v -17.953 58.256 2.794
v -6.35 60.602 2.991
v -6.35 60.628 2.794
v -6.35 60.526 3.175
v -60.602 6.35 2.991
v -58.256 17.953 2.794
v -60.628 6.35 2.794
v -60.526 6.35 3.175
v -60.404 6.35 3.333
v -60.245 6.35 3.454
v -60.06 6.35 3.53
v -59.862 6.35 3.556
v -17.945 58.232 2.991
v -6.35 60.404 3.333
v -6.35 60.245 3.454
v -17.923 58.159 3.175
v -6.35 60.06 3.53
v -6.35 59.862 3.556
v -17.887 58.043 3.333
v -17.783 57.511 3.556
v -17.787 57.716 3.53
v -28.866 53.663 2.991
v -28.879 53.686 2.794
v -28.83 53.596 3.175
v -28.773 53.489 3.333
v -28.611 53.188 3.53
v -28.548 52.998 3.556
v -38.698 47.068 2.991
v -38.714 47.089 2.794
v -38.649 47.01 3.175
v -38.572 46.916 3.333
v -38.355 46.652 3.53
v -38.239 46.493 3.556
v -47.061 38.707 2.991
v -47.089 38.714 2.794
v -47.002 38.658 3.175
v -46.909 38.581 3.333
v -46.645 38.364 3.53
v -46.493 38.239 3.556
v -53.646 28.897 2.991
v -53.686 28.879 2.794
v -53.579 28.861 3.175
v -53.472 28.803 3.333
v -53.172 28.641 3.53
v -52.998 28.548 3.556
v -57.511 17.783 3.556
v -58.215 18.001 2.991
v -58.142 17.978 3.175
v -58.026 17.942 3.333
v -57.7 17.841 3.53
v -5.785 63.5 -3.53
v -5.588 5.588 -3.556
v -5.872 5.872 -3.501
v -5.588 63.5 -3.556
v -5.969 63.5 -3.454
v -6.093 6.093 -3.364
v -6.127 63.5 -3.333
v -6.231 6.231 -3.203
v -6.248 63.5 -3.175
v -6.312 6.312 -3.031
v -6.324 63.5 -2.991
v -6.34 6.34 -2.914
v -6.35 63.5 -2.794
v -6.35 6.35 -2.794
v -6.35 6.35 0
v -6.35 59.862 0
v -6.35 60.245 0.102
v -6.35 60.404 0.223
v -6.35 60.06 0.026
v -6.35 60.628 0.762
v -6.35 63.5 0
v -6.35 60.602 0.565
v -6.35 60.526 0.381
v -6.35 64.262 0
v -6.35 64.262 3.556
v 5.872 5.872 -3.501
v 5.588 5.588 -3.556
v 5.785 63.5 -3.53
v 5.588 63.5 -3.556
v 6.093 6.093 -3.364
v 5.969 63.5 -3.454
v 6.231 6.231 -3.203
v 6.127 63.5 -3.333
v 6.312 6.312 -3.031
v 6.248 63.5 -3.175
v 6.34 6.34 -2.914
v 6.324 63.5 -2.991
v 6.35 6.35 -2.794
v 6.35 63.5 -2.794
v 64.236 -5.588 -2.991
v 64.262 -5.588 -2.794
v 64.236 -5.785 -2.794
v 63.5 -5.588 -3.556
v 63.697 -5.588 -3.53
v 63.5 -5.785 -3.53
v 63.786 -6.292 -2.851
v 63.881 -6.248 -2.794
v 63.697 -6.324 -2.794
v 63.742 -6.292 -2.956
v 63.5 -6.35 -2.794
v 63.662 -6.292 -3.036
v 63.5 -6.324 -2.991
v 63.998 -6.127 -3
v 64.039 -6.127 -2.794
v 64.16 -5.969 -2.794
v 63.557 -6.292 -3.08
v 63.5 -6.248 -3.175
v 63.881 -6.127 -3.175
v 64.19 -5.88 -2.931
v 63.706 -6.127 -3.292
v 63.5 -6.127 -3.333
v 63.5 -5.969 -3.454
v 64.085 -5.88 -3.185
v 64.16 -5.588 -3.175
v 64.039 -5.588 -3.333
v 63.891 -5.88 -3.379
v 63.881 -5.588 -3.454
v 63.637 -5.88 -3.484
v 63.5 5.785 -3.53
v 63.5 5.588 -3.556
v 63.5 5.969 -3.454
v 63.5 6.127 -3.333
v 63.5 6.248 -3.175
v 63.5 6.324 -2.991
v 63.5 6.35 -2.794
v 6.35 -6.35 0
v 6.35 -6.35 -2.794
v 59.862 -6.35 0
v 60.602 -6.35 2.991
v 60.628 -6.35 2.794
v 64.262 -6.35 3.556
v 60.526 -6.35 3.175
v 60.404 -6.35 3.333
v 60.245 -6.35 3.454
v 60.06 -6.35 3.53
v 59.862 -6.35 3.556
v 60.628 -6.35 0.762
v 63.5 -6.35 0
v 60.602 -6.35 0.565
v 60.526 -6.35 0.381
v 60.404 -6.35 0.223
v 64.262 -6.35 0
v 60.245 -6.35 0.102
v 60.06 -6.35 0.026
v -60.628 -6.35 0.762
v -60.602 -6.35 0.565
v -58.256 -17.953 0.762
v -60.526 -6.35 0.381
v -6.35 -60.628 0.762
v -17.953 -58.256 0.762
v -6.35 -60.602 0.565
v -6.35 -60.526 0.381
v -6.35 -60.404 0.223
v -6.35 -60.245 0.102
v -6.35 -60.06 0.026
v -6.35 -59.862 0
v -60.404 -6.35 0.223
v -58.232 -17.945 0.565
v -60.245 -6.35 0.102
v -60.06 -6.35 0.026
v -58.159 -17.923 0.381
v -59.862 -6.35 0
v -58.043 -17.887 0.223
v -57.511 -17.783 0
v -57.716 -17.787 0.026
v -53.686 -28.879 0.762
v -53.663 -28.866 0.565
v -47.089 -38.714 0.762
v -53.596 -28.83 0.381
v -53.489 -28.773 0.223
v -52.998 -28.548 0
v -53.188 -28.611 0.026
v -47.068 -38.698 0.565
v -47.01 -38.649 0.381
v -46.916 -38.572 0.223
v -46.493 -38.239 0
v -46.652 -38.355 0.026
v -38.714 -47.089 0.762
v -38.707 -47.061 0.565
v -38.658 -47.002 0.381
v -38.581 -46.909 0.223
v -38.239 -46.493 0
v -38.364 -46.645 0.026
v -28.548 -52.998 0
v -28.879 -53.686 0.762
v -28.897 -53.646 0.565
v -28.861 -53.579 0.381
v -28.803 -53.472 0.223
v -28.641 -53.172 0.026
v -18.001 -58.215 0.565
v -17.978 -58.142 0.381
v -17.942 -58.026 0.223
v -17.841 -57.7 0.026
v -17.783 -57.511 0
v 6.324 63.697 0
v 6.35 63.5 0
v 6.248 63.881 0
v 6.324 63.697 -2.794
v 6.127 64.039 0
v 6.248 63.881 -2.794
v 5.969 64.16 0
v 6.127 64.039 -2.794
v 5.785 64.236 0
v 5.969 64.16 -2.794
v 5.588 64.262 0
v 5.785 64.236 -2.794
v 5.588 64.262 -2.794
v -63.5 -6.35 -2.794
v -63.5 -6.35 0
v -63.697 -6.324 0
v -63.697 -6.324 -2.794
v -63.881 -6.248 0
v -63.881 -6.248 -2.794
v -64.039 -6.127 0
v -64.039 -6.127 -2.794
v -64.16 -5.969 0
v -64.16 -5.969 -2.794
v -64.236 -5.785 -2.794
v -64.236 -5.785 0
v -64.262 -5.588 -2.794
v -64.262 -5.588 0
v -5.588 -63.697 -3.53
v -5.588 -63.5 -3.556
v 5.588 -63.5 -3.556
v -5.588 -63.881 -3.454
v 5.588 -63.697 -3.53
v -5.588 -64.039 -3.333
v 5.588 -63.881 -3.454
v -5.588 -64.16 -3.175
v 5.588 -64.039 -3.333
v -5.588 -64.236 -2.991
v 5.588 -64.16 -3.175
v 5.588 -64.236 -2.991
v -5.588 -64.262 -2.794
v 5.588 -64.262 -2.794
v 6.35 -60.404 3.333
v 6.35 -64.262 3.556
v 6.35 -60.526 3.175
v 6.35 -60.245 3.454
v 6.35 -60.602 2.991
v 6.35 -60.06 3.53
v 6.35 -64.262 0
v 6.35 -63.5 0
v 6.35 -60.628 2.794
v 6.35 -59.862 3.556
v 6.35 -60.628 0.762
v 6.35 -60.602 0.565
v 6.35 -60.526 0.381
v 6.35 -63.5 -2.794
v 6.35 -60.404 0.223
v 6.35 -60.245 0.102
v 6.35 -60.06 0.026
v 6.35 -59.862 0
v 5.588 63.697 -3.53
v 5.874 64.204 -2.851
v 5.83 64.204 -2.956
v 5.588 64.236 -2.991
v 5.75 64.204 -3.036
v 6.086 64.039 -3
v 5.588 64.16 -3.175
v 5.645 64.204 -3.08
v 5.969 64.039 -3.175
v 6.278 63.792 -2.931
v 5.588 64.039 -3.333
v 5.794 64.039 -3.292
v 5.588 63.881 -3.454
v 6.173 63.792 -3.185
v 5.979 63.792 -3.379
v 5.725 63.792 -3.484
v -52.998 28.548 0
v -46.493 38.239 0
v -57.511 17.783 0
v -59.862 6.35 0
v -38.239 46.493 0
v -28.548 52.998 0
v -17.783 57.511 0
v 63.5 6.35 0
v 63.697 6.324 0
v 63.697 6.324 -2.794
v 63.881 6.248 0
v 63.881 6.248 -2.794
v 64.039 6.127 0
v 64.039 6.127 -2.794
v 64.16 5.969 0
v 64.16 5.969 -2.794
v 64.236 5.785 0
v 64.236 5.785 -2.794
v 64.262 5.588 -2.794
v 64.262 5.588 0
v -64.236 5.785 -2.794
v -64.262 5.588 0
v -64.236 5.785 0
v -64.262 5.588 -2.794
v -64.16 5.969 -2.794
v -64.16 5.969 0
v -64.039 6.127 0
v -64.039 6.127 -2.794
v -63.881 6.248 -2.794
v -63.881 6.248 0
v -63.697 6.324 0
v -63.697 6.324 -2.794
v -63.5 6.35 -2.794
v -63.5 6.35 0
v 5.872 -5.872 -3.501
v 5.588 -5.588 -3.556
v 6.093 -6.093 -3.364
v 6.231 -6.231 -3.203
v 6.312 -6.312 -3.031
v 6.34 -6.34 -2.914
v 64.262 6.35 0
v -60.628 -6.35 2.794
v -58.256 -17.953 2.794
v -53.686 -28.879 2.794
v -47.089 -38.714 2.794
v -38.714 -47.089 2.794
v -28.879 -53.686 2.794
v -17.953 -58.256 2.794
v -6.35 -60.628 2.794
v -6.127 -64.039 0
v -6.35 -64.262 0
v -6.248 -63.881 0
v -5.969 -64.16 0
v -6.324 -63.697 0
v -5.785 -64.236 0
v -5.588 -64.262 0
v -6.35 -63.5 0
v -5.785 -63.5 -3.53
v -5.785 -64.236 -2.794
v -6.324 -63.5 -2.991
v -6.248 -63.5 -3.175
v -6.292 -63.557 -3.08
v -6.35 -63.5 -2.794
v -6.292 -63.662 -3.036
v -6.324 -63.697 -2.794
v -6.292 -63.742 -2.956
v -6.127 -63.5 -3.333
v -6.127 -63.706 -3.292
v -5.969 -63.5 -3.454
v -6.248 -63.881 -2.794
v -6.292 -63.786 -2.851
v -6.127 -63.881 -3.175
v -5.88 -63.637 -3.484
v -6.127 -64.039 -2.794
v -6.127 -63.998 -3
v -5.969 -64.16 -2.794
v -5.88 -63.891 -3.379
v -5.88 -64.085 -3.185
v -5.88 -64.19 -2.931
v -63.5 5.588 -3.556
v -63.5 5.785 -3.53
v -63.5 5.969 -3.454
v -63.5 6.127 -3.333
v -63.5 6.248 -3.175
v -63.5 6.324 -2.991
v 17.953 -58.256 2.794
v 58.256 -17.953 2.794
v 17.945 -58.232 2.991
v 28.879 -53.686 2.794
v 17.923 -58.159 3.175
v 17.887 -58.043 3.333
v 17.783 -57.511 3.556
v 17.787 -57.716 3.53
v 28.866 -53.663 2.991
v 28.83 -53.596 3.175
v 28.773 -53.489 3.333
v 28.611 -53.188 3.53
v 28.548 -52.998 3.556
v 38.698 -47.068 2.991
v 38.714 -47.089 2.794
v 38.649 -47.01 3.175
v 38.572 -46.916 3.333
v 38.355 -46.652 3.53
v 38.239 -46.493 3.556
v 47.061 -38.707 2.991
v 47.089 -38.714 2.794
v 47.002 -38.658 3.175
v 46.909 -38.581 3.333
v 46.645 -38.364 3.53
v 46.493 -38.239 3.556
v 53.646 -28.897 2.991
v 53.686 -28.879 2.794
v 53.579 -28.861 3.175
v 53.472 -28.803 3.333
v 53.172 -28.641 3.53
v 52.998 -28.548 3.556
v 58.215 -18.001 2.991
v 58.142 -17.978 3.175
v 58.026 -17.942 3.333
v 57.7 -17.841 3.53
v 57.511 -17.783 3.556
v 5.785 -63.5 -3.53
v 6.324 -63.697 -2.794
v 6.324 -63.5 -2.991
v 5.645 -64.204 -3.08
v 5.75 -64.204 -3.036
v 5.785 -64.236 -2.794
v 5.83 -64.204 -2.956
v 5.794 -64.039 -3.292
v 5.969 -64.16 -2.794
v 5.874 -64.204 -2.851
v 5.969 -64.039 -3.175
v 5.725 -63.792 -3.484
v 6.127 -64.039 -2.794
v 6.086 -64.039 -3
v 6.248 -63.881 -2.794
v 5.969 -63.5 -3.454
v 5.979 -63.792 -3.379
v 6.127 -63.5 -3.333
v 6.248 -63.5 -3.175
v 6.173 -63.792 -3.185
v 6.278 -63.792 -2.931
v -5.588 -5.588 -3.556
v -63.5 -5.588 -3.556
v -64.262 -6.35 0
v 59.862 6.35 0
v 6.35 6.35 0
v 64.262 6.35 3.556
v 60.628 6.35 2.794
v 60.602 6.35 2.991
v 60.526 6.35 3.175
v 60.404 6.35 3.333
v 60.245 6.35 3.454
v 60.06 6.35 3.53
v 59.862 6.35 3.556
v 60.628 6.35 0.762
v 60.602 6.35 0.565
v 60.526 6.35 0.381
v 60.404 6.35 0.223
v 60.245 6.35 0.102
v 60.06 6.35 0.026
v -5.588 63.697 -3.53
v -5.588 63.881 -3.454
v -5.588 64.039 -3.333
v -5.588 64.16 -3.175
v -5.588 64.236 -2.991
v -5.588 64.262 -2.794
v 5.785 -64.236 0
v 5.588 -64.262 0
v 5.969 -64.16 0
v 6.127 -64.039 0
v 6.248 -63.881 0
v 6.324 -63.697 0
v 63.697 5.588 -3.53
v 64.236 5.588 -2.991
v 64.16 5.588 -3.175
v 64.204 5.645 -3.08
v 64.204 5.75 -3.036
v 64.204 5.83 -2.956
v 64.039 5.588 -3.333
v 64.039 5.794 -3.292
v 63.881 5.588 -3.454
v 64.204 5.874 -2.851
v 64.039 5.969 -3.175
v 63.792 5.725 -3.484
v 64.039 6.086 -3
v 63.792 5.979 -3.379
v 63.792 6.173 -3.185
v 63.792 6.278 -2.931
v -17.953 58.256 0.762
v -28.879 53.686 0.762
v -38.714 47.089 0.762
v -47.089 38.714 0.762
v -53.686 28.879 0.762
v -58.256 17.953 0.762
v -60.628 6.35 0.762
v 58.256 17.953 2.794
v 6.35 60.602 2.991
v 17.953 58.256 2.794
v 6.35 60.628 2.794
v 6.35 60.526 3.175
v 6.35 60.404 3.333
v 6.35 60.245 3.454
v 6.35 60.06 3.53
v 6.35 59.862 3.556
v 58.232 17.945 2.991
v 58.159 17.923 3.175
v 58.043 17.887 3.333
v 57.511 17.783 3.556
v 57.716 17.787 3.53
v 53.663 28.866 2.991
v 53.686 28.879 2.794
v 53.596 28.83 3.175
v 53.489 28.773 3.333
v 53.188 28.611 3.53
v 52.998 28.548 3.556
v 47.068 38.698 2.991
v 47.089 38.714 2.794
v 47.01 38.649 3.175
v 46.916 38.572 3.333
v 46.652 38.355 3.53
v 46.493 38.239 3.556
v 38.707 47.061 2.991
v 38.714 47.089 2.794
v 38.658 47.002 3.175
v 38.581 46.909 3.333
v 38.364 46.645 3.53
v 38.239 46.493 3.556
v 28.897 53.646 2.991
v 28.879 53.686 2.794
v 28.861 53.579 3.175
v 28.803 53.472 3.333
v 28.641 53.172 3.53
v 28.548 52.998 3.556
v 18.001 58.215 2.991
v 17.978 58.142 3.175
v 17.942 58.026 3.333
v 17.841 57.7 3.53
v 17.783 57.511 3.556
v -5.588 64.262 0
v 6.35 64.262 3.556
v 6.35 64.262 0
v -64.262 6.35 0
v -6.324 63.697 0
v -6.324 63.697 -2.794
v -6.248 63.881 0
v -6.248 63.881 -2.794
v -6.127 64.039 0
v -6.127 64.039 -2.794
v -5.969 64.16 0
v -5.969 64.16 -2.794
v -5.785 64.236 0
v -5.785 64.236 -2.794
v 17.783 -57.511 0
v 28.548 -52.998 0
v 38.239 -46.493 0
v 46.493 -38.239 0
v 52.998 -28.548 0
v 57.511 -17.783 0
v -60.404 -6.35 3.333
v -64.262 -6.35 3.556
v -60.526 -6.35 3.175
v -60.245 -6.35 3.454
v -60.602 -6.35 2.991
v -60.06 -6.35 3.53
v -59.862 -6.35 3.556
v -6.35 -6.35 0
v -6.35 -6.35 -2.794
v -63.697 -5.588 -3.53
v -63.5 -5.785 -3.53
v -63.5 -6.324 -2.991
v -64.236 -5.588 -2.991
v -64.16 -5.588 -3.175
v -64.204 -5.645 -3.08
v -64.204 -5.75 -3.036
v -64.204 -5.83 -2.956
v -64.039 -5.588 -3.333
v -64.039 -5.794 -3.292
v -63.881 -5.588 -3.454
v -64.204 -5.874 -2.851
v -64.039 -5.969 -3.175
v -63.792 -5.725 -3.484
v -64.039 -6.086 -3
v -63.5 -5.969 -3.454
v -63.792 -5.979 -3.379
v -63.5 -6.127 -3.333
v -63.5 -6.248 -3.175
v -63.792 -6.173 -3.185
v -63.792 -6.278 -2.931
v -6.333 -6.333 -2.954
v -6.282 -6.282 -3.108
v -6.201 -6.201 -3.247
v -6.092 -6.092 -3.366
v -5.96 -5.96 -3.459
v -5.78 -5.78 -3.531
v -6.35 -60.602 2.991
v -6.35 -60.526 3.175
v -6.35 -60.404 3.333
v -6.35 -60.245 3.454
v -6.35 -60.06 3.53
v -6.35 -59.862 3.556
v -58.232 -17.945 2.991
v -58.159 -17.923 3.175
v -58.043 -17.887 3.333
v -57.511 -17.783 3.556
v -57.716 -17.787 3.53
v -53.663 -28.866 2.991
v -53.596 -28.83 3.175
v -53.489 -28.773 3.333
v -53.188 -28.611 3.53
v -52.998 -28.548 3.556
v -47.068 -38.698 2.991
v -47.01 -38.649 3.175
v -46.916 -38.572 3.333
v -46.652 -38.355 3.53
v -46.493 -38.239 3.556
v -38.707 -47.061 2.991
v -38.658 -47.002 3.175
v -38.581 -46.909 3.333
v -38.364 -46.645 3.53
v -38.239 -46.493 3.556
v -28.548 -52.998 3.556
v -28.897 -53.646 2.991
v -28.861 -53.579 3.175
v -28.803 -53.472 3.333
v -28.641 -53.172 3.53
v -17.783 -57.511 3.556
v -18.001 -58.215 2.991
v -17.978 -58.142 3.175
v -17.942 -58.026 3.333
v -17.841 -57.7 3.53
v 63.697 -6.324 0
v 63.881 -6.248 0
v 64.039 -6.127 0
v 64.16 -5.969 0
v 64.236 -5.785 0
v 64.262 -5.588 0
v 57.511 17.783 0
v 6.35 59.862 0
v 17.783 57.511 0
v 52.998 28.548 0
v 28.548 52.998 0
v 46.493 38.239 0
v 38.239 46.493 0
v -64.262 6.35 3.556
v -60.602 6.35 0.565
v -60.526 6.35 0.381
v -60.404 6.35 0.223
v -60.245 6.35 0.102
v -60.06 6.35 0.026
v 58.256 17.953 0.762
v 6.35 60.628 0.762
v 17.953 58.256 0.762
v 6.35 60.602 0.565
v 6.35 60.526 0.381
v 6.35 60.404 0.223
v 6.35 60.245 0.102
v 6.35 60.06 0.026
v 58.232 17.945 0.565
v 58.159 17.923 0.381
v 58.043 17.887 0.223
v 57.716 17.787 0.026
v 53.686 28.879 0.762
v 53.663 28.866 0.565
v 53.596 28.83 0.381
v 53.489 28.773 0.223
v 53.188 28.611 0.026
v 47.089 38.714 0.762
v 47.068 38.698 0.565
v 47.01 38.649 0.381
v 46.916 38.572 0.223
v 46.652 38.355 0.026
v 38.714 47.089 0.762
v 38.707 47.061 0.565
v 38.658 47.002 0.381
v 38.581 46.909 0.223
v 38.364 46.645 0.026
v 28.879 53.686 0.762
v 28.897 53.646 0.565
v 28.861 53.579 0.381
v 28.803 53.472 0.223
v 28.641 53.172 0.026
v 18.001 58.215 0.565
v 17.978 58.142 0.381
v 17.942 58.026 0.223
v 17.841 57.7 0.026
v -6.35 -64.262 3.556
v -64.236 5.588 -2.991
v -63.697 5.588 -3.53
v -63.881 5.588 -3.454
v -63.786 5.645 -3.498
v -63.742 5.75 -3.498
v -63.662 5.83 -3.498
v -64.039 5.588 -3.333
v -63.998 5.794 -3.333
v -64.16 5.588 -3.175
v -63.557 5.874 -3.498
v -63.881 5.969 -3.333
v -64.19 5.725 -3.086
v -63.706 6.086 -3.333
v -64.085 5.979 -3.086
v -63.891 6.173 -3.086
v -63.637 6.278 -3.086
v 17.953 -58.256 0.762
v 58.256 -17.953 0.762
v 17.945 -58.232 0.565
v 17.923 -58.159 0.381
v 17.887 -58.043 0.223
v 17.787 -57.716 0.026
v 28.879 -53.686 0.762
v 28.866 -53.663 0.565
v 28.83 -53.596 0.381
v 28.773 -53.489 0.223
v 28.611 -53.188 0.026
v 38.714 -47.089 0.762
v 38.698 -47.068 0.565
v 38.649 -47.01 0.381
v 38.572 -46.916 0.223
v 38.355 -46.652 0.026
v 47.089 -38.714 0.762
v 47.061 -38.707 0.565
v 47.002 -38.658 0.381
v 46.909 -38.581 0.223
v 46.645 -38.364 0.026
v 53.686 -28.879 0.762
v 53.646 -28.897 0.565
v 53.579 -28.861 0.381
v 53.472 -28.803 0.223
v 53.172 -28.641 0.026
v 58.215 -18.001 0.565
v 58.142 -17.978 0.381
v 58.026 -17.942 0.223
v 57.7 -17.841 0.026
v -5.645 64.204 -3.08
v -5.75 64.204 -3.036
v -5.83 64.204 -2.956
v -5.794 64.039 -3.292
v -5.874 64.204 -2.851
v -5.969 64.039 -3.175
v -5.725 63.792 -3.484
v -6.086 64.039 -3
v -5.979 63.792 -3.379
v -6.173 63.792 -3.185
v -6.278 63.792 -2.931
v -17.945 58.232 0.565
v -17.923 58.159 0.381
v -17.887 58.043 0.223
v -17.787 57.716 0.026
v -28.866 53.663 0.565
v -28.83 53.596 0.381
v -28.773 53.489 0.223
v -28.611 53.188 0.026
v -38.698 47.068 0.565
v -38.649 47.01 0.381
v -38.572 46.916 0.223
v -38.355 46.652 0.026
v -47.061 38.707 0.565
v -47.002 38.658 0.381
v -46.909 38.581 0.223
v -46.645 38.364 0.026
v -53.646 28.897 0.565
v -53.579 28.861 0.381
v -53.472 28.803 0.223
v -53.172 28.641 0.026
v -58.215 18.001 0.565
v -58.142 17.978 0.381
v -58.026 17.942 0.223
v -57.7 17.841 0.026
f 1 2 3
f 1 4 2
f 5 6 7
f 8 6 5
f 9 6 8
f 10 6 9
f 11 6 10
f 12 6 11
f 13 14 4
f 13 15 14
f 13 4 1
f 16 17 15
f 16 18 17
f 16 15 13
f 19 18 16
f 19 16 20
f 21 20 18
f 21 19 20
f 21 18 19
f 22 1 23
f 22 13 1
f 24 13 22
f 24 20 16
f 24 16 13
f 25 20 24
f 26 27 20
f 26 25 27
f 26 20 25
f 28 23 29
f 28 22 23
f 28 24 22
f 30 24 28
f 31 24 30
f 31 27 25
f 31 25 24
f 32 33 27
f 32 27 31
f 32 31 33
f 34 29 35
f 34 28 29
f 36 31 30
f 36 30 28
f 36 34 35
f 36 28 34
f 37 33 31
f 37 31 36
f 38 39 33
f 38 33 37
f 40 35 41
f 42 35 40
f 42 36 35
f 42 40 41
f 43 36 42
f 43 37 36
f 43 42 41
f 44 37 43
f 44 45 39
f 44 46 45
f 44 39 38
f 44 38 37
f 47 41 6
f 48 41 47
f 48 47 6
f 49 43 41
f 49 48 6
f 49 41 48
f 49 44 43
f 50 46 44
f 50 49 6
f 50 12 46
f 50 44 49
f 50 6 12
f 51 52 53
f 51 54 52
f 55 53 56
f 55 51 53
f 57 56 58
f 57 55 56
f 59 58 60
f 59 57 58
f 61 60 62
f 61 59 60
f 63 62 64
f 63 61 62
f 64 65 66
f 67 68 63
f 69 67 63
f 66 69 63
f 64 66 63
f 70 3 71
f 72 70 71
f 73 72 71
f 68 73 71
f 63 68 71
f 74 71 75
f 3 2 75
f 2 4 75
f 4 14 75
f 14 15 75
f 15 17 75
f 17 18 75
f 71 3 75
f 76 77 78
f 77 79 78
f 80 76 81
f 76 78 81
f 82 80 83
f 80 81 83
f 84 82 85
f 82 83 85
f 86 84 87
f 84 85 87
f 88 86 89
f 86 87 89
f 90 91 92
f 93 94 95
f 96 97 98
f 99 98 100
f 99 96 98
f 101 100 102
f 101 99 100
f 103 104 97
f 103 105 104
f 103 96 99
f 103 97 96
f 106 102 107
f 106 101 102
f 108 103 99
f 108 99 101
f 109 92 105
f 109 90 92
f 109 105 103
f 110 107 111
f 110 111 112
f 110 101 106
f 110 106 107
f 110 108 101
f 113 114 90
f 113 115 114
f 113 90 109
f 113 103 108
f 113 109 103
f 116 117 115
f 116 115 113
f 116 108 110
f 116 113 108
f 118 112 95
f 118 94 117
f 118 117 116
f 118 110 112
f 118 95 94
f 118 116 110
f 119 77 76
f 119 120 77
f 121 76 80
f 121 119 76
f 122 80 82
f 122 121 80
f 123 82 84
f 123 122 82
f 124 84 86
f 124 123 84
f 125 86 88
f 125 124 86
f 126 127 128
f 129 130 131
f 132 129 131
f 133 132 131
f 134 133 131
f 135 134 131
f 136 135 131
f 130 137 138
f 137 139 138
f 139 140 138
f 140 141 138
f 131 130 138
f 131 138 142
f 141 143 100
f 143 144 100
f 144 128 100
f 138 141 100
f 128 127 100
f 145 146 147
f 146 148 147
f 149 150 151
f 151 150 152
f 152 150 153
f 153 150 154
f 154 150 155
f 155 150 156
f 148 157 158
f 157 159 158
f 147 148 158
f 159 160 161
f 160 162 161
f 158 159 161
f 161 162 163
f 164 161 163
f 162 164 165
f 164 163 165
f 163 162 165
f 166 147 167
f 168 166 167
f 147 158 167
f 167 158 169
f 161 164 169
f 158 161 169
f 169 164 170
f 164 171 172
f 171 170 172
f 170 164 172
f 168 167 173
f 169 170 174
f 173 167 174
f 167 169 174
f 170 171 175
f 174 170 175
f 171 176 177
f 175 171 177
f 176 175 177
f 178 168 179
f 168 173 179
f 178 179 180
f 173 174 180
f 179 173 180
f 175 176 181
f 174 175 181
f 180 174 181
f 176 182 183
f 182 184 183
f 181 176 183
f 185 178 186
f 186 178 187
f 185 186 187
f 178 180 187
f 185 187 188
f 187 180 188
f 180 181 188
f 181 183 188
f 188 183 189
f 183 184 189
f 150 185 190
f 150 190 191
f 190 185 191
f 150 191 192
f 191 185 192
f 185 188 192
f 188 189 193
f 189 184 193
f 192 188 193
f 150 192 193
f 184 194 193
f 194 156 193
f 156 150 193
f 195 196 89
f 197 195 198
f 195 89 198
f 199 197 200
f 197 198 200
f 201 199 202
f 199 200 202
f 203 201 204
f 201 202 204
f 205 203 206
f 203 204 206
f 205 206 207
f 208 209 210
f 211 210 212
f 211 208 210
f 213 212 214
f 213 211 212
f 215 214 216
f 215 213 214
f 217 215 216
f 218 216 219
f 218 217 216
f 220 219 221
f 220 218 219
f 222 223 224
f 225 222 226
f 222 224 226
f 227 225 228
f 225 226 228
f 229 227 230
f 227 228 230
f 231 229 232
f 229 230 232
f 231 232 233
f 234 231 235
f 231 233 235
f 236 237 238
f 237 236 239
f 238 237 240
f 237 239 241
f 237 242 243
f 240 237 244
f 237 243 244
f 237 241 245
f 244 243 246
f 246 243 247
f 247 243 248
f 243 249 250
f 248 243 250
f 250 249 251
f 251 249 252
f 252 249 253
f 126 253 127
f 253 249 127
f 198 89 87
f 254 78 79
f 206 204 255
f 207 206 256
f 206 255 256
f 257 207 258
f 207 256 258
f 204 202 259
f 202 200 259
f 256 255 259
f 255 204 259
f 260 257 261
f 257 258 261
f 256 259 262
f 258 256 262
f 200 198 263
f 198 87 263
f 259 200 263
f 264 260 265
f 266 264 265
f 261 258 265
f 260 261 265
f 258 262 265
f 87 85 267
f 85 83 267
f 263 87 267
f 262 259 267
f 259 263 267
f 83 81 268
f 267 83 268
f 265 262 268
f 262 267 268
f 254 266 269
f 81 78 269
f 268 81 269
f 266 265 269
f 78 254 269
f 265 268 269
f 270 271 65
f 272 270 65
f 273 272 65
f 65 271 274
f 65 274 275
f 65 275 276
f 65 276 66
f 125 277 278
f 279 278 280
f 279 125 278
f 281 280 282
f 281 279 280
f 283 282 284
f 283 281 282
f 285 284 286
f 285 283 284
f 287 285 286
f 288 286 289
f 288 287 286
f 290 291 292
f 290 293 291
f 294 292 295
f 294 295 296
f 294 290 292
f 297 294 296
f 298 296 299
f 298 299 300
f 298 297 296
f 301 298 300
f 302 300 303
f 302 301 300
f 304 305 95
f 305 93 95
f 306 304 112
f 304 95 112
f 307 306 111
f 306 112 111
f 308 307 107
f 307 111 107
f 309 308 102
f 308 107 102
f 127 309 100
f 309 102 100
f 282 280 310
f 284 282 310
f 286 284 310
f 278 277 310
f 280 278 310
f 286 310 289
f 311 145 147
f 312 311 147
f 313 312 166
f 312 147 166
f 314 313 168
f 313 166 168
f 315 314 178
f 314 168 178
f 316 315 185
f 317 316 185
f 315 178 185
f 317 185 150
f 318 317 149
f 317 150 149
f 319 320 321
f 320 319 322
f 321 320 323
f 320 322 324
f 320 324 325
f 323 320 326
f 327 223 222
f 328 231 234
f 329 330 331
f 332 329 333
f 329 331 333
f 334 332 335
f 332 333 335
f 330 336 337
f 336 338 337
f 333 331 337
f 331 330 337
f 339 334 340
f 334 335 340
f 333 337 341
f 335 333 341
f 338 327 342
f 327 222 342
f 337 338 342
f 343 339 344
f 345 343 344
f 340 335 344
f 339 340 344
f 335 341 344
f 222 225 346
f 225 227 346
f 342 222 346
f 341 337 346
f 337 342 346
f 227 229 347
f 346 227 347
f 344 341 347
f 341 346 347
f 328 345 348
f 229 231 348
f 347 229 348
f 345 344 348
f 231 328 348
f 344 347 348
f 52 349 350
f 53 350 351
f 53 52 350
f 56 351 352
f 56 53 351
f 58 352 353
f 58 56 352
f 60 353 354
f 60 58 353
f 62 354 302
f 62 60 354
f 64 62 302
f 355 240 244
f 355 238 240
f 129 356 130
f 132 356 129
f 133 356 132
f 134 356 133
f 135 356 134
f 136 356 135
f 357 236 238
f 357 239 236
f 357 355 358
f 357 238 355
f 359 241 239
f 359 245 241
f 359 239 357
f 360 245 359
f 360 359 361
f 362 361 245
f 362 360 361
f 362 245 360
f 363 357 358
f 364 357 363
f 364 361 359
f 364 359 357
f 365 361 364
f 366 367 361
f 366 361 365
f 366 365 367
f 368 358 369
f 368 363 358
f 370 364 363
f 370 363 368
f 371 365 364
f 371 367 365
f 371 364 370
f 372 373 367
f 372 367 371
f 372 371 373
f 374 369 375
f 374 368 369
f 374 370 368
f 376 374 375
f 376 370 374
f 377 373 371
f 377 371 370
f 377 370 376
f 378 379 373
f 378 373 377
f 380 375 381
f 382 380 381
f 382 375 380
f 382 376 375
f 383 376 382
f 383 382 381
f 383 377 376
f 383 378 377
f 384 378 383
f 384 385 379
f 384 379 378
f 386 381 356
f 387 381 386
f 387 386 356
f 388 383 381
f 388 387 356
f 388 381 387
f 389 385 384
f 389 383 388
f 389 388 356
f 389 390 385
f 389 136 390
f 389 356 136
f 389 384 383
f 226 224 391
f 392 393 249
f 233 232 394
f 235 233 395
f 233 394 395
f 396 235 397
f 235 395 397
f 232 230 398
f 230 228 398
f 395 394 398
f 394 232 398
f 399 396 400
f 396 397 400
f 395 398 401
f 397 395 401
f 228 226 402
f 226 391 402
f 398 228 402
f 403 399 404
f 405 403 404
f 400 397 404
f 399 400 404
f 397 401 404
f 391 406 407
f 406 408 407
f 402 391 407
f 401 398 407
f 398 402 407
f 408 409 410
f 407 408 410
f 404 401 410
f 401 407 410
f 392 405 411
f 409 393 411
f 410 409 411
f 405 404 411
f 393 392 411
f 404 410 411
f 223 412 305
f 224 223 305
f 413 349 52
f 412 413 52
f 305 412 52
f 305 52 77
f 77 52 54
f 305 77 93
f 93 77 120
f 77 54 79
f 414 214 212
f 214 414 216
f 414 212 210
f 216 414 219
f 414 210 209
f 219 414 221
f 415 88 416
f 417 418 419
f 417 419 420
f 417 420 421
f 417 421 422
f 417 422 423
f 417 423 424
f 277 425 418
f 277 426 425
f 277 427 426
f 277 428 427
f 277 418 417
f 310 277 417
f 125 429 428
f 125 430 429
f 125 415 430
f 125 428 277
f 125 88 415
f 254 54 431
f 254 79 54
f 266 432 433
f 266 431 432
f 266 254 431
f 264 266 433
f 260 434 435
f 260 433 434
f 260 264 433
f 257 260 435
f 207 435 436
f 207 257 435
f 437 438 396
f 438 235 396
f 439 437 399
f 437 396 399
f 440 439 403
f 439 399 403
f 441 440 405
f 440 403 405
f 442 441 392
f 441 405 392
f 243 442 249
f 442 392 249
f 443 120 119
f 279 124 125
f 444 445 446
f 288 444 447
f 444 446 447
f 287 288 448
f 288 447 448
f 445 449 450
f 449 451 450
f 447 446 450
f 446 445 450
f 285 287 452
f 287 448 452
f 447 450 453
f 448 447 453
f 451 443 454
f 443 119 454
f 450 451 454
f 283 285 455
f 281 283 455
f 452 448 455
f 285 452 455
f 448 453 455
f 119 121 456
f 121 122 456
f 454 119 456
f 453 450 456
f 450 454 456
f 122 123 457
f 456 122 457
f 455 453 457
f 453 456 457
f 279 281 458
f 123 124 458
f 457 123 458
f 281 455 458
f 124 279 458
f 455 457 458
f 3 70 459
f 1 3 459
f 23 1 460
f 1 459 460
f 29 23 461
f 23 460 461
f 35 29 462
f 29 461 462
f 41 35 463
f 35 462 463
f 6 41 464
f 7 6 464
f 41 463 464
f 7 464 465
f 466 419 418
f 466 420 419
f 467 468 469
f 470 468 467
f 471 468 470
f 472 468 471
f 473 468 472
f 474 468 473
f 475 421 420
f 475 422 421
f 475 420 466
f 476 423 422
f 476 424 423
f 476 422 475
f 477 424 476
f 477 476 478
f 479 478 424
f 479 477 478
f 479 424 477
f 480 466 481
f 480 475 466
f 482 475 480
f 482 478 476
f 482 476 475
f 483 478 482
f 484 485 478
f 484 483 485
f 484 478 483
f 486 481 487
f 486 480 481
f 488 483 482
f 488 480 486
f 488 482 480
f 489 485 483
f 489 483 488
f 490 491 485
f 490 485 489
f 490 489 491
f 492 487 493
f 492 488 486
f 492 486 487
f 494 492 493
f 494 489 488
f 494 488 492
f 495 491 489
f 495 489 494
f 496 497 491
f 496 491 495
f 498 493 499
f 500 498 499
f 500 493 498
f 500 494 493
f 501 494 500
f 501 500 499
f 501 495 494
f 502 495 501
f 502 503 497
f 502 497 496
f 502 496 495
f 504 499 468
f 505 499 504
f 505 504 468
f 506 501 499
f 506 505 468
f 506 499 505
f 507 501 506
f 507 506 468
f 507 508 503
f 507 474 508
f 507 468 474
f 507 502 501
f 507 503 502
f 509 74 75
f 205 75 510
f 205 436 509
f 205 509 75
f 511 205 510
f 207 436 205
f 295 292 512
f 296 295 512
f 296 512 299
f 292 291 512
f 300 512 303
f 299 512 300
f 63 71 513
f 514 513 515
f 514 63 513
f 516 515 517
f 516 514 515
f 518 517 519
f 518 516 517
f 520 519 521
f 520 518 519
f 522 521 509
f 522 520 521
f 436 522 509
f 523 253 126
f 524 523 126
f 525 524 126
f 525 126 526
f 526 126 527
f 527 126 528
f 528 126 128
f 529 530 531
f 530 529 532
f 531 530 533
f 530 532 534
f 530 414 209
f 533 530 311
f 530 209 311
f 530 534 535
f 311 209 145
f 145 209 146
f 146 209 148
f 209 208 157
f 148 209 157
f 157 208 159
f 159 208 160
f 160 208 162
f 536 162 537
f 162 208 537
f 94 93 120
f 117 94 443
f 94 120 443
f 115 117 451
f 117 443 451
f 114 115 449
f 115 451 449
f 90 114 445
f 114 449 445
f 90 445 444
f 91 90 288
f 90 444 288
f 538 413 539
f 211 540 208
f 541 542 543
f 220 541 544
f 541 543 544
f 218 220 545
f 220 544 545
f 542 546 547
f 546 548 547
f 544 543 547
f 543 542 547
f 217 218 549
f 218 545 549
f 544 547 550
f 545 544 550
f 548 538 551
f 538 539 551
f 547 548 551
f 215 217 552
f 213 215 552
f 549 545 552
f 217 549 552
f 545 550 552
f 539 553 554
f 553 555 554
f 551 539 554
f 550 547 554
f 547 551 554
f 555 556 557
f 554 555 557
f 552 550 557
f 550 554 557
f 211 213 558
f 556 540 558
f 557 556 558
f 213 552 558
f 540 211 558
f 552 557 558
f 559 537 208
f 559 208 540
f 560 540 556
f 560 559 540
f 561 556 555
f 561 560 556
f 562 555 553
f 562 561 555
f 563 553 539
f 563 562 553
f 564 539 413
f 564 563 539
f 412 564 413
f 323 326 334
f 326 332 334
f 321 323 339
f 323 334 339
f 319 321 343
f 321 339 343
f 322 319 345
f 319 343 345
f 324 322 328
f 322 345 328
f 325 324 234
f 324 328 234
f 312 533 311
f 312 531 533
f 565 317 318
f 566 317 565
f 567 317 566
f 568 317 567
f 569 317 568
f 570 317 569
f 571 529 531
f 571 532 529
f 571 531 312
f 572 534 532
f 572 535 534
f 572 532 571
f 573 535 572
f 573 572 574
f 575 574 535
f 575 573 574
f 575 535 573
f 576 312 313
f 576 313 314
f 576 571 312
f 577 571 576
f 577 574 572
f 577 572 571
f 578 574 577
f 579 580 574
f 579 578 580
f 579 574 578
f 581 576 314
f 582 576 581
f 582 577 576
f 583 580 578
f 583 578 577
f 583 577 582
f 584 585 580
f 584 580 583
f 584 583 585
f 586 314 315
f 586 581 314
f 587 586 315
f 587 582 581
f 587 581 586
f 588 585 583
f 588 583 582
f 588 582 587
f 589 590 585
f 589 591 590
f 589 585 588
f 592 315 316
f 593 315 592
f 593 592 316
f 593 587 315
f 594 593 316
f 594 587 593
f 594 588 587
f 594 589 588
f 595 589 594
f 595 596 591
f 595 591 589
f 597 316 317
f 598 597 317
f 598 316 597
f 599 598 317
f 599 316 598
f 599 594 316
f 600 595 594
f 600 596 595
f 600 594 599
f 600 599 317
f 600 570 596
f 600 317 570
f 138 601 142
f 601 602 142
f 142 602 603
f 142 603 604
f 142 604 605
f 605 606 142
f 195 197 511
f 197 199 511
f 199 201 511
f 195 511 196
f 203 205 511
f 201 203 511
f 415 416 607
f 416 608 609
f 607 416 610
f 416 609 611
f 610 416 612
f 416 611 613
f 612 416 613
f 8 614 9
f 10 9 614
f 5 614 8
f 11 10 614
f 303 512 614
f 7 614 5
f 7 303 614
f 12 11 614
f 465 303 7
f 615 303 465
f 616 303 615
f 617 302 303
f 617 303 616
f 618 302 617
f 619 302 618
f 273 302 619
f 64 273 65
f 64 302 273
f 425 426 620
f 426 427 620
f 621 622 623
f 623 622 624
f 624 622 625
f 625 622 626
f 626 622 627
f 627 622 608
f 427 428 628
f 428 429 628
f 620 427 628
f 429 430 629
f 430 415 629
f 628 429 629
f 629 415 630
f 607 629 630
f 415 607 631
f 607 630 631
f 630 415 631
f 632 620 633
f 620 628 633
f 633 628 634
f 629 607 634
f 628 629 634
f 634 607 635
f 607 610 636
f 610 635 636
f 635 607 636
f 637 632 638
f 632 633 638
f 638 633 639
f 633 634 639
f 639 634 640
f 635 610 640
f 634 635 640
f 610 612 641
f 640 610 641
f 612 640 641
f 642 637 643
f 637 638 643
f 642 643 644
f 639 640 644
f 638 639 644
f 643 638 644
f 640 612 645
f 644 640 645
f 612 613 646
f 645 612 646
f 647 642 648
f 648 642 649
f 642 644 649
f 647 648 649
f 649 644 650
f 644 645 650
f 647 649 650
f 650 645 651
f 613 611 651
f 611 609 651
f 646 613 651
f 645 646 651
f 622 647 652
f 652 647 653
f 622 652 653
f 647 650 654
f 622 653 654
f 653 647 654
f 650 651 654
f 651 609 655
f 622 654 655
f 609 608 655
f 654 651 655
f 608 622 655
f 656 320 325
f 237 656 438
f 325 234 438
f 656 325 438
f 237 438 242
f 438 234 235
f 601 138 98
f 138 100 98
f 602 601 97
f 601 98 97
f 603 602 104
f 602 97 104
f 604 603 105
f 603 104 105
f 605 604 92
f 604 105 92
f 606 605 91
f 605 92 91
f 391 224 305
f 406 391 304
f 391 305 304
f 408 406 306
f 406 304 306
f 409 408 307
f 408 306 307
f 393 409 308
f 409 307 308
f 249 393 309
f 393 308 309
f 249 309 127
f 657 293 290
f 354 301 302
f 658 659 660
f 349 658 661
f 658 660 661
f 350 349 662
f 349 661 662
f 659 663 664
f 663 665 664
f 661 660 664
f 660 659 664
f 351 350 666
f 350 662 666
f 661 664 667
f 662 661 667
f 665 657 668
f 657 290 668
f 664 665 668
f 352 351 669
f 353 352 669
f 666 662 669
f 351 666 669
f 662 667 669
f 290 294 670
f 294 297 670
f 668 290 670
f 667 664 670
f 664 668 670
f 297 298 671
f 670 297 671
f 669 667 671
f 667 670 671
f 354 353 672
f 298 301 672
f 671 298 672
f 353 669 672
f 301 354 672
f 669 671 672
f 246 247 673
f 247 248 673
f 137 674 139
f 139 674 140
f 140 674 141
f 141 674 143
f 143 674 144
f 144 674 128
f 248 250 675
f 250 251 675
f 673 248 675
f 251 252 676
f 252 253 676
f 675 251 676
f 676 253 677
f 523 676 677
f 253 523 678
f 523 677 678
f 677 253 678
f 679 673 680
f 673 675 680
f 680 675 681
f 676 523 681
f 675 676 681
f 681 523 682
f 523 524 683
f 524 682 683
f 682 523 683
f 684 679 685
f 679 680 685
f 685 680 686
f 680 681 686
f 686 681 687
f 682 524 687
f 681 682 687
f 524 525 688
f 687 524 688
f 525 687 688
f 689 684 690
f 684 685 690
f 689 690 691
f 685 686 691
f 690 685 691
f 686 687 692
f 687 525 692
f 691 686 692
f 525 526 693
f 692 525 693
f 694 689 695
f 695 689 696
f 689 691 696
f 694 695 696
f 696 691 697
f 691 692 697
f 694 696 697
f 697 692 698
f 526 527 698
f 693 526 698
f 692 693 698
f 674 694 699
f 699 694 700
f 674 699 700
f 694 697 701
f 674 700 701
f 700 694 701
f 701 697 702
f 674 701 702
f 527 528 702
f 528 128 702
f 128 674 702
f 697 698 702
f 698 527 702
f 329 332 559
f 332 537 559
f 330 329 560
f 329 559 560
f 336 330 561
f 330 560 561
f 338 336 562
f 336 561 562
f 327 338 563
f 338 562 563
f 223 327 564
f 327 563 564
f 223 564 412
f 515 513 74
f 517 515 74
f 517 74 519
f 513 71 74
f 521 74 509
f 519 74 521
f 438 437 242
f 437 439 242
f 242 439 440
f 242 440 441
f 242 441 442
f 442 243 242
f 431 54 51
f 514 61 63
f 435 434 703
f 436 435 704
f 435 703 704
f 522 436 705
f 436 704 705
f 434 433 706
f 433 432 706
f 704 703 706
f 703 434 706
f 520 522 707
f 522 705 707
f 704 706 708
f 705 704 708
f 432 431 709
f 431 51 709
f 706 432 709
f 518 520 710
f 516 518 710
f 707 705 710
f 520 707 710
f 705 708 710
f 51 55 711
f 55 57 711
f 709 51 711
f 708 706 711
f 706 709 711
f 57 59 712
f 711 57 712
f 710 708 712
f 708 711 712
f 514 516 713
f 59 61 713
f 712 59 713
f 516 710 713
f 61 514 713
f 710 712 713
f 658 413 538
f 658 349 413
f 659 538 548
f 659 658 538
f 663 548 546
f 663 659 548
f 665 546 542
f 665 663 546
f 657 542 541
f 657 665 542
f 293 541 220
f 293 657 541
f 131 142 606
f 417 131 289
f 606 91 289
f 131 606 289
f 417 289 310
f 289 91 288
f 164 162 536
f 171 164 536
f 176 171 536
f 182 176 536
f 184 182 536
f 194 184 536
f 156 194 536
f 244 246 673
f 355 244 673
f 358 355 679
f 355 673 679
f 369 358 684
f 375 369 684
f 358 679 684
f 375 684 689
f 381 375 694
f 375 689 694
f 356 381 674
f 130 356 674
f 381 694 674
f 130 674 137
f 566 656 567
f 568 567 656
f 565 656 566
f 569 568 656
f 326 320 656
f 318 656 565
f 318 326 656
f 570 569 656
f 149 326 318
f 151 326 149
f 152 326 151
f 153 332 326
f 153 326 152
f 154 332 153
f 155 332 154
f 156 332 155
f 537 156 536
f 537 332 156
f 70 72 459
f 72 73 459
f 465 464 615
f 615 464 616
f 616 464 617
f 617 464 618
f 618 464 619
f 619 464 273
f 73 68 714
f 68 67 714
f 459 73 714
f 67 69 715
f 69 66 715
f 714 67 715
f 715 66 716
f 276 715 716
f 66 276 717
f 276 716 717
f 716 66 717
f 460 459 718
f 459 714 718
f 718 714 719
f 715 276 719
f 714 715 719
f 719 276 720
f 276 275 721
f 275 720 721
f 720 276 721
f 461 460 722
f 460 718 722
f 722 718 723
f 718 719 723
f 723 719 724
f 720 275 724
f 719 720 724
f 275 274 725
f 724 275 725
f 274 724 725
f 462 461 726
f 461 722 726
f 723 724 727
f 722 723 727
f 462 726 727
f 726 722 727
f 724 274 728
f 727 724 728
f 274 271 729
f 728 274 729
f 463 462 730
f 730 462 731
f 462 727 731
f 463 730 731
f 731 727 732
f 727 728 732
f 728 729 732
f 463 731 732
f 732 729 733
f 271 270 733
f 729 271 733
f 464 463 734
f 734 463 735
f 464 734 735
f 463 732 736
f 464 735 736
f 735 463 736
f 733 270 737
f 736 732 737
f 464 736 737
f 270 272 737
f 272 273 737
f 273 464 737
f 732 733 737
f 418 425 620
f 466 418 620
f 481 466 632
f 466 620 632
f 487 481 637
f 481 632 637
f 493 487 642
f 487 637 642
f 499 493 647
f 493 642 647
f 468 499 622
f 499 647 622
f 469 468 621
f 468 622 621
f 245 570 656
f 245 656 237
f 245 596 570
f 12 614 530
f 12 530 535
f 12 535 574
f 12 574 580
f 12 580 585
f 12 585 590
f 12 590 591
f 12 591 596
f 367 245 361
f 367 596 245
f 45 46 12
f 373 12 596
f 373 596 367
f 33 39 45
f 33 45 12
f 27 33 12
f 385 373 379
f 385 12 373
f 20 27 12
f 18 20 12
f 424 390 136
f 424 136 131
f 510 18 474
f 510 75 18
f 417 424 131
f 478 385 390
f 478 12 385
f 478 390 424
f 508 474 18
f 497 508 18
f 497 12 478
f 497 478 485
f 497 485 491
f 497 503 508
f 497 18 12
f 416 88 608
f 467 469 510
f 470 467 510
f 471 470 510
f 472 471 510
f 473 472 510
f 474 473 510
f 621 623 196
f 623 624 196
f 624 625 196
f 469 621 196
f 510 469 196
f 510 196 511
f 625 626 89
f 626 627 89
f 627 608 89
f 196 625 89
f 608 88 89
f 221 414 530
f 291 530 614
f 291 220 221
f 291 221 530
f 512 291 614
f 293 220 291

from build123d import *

# Parameters (mm, degrees)
SKETCH2_R           = 60.96
BOSS_EXTRUDE1_DEPTH = 3.556
FILLET1_R           = 0.762
SKETCH3_W           = 128.524
SKETCH3_H           = 12.7
BOSS_EXTRUDE2_DEPTH = 3.556
SKETCH4_W           = 12.7
SKETCH4_H           = 128.524
BOSS_EXTRUDE3_DEPTH = 3.556
FILLET2_R           = 0.762
SKETCH3_2_W         = 128.524
SKETCH3_2_H         = 12.7
BOSS_EXTRUDE4_DEPTH = 3.556
SKETCH4_2_W         = 12.7
SKETCH4_2_H         = 128.524
BOSS_EXTRUDE5_DEPTH = 3.556


with BuildPart() as part:
    # Sketch2 → Boss-Extrude1 (new body)
    with BuildSketch(Plane.XY):
        Circle(SKETCH2_R)
    extrude(amount=BOSS_EXTRUDE1_DEPTH)

    # Fillet1
    fillet1_edges = [part.edges().sort_by_distance(p)[0] for p in [
        (-60.96, 0, 0),
        (-60.96, 0, 3.556),
    ]]
    fillet(fillet1_edges, radius=FILLET1_R)

    # Sketch3 → Boss-Extrude2 (add)
    with BuildSketch(Plane.XY):
        Rectangle(SKETCH3_W, SKETCH3_H)
    extrude(amount=-BOSS_EXTRUDE2_DEPTH)

    # Sketch4 → Boss-Extrude3 (add)
    with BuildSketch(Plane.XY):
        Rectangle(SKETCH4_W, SKETCH4_H)
    extrude(amount=-BOSS_EXTRUDE3_DEPTH)

    # Fillet2
    fillet2_edges = [part.edges().sort_by_distance(p)[0] for p in [
        (35.306, 6.35, -3.556),
        (-64.262, 6.35, -1.778),
        (64.262, 0, -3.556),
        (64.262, 6.35, -1.778),
        (-35.306, -6.35, -3.556),
        (64.262, -6.35, -1.778),
        (-64.262, 0, -3.556),
        (-64.262, -6.35, -1.778),
        (-35.306, 6.35, -3.556),
        (35.306, -6.35, -3.556),
        (6.35, 35.306, -3.556),
        (6.35, 64.262, -1.778),
        (-6.35, 35.306, -3.556),
        (6.35, -35.306, -3.556),
        (0, -64.262, -3.556),
        (6.35, -64.262, -1.778),
        (-6.35, -35.306, -3.556),
        (-6.35, -64.262, -1.778),
        (0, 64.262, -3.556),
        (-6.35, 64.262, -1.778),
    ]]
    fillet(fillet2_edges, radius=FILLET2_R)

    # Sketch3<2> → Boss-Extrude4 (add)
    with BuildSketch(Plane.XY):
        Rectangle(SKETCH3_2_W, SKETCH3_2_H)
    extrude(amount=BOSS_EXTRUDE4_DEPTH)

    # Sketch4<2> → Boss-Extrude5 (add)
    with BuildSketch(Plane.XY):
        Rectangle(SKETCH4_2_W, SKETCH4_2_H)
    extrude(amount=BOSS_EXTRUDE5_DEPTH)


solid = part.part
